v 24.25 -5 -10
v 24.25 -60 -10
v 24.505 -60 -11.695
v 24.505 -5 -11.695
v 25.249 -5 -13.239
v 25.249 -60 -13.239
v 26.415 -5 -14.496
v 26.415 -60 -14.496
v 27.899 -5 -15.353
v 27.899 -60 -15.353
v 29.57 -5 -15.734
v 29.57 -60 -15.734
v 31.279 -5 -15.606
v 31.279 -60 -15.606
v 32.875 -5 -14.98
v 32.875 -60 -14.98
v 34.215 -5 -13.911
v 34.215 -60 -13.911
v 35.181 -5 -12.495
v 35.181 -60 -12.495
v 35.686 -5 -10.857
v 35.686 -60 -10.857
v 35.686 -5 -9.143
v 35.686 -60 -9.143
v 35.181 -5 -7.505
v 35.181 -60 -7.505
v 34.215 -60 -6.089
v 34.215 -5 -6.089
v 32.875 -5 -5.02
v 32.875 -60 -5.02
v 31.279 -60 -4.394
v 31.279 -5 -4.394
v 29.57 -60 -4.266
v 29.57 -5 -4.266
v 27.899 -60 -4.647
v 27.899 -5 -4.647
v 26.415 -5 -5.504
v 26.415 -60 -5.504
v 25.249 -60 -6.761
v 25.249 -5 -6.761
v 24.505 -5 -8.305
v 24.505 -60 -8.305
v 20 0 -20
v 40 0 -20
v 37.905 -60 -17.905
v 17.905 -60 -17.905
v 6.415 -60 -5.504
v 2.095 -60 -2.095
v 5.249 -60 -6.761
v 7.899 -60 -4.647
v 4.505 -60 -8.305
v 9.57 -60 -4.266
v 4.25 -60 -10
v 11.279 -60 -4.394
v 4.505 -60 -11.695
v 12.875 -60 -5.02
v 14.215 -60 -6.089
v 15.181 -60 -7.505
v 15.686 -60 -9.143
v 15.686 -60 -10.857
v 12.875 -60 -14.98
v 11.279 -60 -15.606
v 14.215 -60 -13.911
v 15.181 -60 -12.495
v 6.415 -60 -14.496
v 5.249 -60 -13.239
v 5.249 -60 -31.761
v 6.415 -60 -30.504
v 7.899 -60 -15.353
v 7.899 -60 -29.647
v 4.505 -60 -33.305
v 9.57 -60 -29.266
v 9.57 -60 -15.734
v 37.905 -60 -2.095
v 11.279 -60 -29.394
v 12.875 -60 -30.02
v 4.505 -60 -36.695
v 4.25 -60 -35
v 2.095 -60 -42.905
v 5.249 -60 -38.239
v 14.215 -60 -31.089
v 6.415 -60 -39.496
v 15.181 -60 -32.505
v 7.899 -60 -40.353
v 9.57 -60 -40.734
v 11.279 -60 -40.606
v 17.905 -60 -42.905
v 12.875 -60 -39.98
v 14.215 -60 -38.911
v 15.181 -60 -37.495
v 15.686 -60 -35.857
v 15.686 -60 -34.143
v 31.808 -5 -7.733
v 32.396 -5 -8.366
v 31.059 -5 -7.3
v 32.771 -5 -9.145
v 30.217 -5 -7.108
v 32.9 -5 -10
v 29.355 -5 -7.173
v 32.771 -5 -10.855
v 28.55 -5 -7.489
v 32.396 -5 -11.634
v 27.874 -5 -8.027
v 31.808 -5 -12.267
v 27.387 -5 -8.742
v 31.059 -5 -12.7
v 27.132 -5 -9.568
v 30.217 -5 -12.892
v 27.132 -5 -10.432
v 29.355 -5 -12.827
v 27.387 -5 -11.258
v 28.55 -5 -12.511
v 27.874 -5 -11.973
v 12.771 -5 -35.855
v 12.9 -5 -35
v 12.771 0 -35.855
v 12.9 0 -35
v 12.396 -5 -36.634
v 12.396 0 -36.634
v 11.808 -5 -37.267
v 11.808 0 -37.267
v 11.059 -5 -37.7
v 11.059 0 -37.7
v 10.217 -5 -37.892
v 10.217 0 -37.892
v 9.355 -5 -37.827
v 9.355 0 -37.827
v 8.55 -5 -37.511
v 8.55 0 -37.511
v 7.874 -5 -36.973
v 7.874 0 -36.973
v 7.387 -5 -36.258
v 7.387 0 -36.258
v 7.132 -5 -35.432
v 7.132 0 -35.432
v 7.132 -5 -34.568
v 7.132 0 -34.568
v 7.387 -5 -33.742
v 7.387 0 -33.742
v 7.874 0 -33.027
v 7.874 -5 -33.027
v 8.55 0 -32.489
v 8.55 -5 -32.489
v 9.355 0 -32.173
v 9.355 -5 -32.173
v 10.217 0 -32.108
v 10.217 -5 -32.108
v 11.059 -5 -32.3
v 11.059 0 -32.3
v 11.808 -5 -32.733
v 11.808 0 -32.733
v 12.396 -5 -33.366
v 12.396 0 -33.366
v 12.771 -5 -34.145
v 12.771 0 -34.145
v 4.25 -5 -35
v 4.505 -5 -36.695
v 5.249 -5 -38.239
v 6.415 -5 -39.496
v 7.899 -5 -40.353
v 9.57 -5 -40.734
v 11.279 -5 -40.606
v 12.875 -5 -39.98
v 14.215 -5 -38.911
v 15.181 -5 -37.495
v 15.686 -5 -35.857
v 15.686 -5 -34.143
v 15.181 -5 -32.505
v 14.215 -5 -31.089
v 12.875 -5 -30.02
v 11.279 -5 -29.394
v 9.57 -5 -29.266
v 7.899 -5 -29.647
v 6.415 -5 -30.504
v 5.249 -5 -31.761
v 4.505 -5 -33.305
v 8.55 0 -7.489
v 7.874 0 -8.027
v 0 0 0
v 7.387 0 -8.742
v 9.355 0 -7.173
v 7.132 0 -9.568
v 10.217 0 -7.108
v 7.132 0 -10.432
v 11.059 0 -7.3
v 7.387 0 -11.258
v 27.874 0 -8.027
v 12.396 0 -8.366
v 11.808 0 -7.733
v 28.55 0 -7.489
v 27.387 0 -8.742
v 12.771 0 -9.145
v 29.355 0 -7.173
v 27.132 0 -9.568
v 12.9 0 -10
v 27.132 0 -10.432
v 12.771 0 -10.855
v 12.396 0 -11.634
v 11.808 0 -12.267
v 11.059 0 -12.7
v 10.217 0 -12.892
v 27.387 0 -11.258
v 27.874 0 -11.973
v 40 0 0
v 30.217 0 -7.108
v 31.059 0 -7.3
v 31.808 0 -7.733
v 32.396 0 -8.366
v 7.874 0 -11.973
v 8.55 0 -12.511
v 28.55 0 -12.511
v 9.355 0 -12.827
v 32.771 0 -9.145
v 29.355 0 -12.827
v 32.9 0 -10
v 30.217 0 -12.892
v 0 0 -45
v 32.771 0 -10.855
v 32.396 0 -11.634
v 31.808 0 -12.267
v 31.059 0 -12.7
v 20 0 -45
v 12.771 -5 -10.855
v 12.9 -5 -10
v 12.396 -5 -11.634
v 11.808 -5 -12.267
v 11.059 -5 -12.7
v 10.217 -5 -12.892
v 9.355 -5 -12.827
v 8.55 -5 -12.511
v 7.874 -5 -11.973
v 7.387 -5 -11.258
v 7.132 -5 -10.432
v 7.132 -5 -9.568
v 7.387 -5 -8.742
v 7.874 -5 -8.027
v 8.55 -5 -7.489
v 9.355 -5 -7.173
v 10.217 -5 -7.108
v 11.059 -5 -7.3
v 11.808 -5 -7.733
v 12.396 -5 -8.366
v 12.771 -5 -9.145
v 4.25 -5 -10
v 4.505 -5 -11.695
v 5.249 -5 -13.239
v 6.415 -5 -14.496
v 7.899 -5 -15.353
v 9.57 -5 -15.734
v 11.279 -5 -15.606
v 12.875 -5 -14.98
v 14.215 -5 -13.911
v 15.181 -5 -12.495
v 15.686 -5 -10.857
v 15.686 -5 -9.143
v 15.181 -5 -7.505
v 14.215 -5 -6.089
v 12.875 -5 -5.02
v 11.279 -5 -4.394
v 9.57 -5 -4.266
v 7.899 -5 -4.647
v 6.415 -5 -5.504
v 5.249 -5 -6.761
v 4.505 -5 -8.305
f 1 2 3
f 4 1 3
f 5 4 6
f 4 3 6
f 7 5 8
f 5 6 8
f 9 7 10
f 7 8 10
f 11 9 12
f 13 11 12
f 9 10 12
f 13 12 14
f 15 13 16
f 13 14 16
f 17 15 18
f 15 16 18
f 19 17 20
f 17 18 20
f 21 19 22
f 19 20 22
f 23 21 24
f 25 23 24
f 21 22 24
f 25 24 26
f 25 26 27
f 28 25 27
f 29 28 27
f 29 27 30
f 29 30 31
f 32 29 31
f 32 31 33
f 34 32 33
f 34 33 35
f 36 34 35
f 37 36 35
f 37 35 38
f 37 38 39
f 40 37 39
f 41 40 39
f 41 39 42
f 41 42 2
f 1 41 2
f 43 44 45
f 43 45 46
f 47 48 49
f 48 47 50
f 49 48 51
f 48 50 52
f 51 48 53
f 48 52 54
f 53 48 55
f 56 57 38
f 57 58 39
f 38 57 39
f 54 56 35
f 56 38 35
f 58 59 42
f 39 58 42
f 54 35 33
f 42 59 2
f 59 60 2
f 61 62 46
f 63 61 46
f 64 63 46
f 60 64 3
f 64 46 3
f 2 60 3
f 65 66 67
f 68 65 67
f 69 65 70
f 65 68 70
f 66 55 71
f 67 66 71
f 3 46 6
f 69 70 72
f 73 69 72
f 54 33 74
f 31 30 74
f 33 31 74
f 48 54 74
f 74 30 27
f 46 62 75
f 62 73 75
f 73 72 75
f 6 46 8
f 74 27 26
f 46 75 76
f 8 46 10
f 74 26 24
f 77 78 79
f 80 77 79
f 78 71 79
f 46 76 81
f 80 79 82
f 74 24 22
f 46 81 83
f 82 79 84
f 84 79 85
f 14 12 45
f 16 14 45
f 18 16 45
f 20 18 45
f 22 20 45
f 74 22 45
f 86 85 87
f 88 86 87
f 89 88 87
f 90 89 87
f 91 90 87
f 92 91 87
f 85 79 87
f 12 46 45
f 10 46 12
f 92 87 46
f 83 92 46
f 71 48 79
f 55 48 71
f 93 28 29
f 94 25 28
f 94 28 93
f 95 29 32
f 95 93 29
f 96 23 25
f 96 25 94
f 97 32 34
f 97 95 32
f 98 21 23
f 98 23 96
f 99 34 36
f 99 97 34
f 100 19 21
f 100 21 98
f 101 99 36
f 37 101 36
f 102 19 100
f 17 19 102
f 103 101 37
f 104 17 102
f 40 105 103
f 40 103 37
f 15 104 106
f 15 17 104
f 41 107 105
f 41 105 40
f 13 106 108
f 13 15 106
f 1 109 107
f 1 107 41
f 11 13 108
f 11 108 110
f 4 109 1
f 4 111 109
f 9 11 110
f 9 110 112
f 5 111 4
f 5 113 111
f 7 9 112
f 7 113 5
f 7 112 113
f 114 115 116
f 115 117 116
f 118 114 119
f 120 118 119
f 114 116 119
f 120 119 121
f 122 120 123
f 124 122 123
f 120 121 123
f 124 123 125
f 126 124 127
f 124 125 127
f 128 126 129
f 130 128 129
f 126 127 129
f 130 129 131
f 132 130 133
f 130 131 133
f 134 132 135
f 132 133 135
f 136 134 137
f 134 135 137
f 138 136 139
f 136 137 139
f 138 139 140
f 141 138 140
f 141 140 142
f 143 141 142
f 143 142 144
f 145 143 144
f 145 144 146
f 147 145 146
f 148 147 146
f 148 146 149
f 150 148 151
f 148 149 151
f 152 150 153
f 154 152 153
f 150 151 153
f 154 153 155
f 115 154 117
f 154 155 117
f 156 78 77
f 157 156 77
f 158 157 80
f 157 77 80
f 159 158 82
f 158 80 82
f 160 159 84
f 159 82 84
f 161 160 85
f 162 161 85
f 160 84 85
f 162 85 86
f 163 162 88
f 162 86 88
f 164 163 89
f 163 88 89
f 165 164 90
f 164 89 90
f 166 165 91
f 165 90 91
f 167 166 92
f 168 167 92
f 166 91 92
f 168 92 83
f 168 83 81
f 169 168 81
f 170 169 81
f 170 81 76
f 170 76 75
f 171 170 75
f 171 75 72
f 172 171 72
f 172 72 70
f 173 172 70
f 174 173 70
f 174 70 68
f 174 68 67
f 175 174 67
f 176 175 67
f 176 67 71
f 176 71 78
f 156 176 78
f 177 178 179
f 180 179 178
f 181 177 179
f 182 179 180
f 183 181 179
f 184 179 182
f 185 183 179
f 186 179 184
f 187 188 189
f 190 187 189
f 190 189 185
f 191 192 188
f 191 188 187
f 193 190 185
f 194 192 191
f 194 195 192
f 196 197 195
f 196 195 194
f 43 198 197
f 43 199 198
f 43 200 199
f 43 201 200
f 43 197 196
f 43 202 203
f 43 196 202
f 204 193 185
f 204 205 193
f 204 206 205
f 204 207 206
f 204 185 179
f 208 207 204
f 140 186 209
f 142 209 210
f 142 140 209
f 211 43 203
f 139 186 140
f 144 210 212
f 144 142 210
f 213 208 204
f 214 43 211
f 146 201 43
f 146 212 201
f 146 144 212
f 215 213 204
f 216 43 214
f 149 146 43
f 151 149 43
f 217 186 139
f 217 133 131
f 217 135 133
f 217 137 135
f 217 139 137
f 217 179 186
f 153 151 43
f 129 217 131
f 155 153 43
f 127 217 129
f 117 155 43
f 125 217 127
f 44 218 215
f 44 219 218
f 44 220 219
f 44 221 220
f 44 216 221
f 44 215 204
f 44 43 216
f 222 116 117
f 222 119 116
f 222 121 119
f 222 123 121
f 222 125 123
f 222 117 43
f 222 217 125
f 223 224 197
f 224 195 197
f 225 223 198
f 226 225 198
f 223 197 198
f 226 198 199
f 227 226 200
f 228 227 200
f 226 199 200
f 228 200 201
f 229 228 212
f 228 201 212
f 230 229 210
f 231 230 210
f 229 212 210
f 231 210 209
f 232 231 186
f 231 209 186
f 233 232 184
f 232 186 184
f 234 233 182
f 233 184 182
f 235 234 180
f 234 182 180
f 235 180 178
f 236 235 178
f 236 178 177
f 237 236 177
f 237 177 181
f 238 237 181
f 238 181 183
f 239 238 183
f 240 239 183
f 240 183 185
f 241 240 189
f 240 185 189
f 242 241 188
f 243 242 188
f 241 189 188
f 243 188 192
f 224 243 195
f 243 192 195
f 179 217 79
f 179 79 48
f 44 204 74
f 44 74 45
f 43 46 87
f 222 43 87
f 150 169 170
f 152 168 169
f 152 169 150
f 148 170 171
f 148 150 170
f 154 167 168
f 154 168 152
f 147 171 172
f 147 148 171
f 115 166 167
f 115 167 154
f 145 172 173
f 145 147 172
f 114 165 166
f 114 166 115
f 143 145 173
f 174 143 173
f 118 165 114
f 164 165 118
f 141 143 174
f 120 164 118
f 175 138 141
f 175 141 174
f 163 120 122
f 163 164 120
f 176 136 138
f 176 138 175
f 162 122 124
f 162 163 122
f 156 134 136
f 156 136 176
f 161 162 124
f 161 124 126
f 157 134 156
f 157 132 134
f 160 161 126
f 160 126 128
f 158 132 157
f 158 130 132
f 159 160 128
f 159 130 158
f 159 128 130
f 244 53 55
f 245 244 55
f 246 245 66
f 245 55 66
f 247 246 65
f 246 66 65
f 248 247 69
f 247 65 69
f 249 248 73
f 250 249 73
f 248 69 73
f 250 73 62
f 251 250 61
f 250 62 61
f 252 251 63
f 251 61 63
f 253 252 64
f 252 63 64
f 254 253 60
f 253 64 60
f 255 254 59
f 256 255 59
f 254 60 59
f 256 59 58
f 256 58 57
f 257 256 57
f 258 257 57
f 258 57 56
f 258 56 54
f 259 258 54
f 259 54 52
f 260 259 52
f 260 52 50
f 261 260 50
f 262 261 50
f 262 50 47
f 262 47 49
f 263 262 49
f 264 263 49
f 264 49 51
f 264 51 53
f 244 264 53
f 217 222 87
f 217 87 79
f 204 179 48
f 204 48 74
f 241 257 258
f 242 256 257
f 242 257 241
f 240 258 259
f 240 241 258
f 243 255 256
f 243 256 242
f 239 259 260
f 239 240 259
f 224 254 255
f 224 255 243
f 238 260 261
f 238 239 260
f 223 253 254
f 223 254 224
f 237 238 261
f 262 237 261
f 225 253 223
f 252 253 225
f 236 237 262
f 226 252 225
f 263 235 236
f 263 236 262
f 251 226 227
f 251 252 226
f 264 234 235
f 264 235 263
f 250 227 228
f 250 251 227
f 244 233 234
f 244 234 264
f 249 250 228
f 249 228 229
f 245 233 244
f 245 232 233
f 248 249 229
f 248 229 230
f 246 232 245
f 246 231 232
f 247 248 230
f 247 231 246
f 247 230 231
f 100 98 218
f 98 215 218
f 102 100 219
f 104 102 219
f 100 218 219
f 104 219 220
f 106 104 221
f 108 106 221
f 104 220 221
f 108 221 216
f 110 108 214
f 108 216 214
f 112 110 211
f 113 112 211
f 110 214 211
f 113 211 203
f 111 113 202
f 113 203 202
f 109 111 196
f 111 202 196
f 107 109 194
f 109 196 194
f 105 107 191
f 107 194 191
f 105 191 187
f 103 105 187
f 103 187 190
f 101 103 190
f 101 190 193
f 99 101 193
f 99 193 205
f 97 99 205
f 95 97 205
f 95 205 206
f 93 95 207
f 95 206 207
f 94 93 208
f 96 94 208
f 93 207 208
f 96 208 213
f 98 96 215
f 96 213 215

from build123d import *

# Parameters (mm, degrees)
BOSS_EXTRUDE1_DEPTH             = 60
BOSS_EXTRUDE1_DRAFT             = -2
CBORE_FOR_M5_SBHCS1_D           = 5.8
CBORE_FOR_M5_SBHCS1_CBORE_D     = 11.5
CBORE_FOR_M5_SBHCS1_CBORE_DEPTH = 55


with BuildPart() as part:
    # Sketch1 → Boss-Extrude1 (with draft: the straight prism first)
    with BuildSketch(Plane(origin=(0, 0, 0), x_dir=(1, 0, 0), z_dir=(0, 1, 0))):
        Polygon((0, 0), (40, 0), (40, 20), (20, 20), (20, 45), (0, 45), align=None)
    extrude(amount=-BOSS_EXTRUDE1_DEPTH)
    # Boss-Extrude1: the draft: its side faces are tilted about the plane it starts from
    boss_extrude1_sides = [part.faces().sort_by_distance(p)[0] for p in [
        (20, -30, 0),
        (40, -30, -10),
        (30, -30, -20),
        (20, -30, -32.5),
        (10, -30, -45),
        (0, -30, -22.5),
    ]]
    draft(boss_extrude1_sides, Plane(origin=(0, 0, 0), x_dir=(1, 0, 0), z_dir=(0, 1, 0)), BOSS_EXTRUDE1_DRAFT)

    # CBORE for M5 SBHCS1 (through all)
    with Locations(Plane(origin=(0, -60, 0), x_dir=(-1, 0, 0), z_dir=(0, -1, 0))):
        with Locations((-10, 10), (-30, 10), (-10, 35)):
            CounterBoreHole(CBORE_FOR_M5_SBHCS1_D / 2, CBORE_FOR_M5_SBHCS1_CBORE_D / 2, CBORE_FOR_M5_SBHCS1_CBORE_DEPTH)


solid = part.part
